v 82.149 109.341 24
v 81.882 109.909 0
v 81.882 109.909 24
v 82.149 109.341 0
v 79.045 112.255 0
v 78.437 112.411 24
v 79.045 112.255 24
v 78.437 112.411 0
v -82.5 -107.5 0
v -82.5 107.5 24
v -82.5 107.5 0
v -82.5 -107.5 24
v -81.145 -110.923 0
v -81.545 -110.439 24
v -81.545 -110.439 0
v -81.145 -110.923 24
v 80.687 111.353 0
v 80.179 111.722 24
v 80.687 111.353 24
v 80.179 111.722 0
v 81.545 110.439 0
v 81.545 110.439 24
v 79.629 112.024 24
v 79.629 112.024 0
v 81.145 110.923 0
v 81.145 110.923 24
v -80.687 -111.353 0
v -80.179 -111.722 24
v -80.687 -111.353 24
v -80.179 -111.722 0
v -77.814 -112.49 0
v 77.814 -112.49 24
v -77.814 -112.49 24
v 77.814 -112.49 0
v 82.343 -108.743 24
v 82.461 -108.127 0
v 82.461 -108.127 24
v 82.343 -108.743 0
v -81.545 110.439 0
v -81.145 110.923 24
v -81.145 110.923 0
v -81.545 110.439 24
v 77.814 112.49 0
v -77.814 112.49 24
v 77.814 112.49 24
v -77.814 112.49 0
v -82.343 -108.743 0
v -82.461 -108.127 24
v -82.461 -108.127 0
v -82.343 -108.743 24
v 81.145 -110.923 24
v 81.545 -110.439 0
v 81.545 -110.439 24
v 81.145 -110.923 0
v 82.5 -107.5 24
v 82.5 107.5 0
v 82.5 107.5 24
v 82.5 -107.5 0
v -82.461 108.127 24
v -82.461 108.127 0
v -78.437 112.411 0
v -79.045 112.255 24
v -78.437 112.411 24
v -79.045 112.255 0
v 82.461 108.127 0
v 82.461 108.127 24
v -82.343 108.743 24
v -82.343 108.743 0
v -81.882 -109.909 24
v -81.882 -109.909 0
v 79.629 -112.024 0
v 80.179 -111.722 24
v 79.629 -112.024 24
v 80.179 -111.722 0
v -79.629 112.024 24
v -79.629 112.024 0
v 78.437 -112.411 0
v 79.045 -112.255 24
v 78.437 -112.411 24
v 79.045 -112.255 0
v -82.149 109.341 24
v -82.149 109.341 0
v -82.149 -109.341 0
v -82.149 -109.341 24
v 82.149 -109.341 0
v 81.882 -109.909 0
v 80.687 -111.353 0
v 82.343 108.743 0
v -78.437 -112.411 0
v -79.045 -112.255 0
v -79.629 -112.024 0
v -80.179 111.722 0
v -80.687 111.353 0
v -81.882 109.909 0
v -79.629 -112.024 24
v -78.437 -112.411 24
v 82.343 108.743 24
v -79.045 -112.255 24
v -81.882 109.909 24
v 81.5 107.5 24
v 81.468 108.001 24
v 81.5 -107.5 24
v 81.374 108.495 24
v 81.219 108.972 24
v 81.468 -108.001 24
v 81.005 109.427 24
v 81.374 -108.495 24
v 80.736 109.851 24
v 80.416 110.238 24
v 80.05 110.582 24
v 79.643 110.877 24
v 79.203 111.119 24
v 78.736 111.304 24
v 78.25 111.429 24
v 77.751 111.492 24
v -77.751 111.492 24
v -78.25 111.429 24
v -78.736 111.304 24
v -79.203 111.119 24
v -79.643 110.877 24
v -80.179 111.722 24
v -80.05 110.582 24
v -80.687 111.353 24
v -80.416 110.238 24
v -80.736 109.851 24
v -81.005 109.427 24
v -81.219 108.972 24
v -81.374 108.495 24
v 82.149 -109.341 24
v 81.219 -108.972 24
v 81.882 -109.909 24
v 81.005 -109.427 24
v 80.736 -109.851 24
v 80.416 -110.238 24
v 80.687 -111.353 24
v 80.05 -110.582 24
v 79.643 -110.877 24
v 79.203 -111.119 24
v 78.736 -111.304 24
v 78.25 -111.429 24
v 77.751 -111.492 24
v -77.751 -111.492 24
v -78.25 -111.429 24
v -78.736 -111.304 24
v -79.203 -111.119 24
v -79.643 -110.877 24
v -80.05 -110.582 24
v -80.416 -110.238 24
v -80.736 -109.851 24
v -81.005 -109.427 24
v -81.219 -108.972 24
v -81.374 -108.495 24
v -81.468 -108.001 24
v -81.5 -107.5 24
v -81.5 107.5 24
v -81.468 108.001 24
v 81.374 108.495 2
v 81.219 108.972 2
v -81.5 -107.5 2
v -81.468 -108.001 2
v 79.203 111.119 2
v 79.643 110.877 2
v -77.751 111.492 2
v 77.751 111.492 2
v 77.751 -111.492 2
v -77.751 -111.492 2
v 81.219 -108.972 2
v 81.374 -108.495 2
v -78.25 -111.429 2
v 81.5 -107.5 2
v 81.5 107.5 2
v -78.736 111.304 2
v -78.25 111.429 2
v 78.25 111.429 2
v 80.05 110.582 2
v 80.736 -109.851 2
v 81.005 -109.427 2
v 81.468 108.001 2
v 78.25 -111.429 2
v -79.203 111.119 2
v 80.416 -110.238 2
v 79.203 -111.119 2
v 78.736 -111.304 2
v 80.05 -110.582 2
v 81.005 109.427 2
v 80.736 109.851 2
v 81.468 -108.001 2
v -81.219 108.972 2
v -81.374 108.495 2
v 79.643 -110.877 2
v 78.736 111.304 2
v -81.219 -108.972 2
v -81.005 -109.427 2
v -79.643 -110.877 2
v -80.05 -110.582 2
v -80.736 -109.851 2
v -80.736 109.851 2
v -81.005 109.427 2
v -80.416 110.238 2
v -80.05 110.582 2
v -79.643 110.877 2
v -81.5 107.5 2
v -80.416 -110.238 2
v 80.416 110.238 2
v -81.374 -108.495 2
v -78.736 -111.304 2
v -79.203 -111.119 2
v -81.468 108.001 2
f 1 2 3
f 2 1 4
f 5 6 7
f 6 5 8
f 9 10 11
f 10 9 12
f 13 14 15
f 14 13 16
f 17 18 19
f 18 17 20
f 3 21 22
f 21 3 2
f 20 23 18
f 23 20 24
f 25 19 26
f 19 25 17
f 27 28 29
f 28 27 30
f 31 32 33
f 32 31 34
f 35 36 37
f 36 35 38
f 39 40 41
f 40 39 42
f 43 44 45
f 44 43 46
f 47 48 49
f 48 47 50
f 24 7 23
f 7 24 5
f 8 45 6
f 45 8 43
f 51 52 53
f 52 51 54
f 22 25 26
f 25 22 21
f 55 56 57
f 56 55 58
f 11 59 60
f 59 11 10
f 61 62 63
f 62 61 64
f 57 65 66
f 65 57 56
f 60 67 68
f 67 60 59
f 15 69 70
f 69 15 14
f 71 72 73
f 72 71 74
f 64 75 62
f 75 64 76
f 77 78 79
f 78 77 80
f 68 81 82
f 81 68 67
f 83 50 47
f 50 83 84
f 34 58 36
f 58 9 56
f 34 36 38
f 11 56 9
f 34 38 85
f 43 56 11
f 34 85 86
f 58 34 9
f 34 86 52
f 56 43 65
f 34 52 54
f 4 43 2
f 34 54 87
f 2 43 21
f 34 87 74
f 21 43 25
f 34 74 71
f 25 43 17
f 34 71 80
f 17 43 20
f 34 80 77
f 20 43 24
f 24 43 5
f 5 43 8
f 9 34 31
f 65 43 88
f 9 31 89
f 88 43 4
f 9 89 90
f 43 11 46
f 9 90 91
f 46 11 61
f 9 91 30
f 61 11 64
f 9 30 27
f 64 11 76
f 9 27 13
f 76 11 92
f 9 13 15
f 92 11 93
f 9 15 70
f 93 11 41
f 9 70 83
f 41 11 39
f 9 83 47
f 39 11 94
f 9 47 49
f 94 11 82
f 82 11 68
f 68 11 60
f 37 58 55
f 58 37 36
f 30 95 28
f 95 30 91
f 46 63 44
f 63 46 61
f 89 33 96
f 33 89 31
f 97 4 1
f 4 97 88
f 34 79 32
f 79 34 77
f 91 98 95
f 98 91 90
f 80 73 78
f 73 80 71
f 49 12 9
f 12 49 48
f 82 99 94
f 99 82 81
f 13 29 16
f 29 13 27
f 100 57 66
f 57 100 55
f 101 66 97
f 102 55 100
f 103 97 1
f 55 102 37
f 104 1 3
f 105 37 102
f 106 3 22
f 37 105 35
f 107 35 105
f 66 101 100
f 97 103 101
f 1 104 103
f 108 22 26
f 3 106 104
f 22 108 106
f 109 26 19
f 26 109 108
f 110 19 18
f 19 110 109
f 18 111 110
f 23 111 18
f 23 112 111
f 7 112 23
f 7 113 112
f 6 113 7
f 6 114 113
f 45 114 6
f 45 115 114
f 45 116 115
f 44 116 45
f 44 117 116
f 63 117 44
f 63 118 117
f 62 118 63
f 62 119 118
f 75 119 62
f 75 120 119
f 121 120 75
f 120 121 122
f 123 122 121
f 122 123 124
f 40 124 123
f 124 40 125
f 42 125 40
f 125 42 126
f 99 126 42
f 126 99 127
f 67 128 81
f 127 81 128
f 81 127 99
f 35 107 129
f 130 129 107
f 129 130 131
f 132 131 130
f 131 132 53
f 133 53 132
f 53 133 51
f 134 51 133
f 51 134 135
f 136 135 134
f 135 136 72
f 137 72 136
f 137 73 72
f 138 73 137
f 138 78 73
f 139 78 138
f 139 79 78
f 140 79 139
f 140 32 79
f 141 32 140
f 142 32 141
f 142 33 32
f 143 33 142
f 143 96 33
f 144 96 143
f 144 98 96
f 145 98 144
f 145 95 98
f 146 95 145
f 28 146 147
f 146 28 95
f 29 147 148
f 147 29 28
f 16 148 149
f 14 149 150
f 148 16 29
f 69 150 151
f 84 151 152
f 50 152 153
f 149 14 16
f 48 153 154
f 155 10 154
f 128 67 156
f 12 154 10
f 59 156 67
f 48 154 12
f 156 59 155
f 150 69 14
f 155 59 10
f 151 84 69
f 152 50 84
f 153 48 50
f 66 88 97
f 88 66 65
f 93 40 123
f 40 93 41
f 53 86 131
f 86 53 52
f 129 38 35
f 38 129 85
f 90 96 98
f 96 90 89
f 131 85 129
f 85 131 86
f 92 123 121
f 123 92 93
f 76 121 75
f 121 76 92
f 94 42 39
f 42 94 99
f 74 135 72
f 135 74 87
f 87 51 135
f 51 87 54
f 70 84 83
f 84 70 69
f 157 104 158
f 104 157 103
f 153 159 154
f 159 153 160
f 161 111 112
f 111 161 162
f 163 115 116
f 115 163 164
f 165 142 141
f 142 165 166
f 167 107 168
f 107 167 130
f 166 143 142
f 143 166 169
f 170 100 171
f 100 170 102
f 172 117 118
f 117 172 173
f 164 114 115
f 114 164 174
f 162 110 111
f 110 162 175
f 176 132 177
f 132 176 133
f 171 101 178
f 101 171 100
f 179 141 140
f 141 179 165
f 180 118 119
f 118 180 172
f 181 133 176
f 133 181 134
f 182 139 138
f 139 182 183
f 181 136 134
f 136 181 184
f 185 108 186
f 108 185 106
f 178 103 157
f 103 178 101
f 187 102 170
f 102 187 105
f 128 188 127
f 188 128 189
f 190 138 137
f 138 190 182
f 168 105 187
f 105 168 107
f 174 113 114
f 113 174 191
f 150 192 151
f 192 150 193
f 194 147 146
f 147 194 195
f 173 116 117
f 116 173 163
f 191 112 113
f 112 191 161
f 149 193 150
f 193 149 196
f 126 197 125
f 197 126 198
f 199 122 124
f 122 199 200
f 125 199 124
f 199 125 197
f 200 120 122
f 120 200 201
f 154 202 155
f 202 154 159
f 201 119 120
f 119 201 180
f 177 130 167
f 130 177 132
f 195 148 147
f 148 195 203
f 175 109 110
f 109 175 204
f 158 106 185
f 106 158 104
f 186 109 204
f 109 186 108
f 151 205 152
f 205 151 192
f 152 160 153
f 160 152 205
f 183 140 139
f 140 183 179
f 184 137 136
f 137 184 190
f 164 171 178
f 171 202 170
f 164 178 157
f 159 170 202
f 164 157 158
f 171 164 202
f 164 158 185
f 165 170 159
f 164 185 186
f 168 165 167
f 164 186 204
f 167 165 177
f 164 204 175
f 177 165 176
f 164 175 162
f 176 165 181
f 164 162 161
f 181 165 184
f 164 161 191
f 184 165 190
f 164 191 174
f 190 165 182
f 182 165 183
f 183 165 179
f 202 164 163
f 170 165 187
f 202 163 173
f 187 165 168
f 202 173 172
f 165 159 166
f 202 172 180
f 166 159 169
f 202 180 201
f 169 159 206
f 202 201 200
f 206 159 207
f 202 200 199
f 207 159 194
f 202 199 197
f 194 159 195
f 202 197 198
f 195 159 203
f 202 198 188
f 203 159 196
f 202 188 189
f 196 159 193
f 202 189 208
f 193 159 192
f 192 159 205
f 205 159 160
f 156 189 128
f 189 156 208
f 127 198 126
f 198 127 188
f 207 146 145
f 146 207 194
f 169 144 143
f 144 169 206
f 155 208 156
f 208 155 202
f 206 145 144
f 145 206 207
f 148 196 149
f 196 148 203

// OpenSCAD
$fn = 50;


difference() {
	union() {
		hull() {
			translate(v = [-77.5000000000, 107.5000000000, 0]) {
				cylinder(h = 24, r = 5);
			}
			translate(v = [77.5000000000, 107.5000000000, 0]) {
				cylinder(h = 24, r = 5);
			}
			translate(v = [-77.5000000000, -107.5000000000, 0]) {
				cylinder(h = 24, r = 5);
			}
			translate(v = [77.5000000000, -107.5000000000, 0]) {
				cylinder(h = 24, r = 5);
			}
		}
	}
	union() {
		translate(v = [0, 0, 2]) {
			hull() {
				translate(v = [-77.5000000000, 107.5000000000, 0]) {
					cylinder(h = 22, r = 4);
				}
				translate(v = [77.5000000000, 107.5000000000, 0]) {
					cylinder(h = 22, r = 4);
				}
				translate(v = [-77.5000000000, -107.5000000000, 0]) {
					cylinder(h = 22, r = 4);
				}
				translate(v = [77.5000000000, -107.5000000000, 0]) {
					cylinder(h = 22, r = 4);
				}
			}
		}
	}
}
